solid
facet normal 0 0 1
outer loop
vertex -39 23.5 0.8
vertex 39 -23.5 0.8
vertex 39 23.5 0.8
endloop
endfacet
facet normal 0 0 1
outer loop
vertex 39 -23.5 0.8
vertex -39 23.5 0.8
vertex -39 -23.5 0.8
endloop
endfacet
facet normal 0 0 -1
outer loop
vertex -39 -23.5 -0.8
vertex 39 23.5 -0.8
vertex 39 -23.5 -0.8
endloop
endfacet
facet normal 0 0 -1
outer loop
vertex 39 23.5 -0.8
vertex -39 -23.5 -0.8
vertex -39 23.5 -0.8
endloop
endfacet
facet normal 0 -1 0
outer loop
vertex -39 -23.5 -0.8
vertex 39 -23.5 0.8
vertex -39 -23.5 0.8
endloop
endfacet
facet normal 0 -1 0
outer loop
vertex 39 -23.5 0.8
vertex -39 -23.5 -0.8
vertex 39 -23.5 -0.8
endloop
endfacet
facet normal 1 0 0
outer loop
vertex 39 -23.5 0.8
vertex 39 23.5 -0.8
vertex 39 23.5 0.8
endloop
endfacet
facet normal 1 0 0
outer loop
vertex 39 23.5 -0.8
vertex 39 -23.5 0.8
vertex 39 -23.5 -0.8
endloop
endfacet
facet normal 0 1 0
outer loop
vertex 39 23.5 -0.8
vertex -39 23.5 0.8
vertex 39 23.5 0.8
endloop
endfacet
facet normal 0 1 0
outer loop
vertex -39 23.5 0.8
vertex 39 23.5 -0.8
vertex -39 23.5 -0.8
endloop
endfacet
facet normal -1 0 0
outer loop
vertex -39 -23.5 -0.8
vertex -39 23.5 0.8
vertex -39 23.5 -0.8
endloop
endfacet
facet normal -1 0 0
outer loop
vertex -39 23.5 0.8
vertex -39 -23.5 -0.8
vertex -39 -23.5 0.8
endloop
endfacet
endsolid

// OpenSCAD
// Parameters
length = 78; //[39:156:0.5]
width = 47; //[23.5:94:0.5]
thickness = 1.6; //[0.8:3.2:0.1]
corner_radius = 0; //[0:10:0.5]

// PCB Module - simple rectangular prism
module mod() {
  color([0.0, 0.4, 0.2]) { // Green color for PCB
    cube([length, width, thickness], center=true);
  }
}

// Assembly
module assembly() {
  mod();
}

assembly();
